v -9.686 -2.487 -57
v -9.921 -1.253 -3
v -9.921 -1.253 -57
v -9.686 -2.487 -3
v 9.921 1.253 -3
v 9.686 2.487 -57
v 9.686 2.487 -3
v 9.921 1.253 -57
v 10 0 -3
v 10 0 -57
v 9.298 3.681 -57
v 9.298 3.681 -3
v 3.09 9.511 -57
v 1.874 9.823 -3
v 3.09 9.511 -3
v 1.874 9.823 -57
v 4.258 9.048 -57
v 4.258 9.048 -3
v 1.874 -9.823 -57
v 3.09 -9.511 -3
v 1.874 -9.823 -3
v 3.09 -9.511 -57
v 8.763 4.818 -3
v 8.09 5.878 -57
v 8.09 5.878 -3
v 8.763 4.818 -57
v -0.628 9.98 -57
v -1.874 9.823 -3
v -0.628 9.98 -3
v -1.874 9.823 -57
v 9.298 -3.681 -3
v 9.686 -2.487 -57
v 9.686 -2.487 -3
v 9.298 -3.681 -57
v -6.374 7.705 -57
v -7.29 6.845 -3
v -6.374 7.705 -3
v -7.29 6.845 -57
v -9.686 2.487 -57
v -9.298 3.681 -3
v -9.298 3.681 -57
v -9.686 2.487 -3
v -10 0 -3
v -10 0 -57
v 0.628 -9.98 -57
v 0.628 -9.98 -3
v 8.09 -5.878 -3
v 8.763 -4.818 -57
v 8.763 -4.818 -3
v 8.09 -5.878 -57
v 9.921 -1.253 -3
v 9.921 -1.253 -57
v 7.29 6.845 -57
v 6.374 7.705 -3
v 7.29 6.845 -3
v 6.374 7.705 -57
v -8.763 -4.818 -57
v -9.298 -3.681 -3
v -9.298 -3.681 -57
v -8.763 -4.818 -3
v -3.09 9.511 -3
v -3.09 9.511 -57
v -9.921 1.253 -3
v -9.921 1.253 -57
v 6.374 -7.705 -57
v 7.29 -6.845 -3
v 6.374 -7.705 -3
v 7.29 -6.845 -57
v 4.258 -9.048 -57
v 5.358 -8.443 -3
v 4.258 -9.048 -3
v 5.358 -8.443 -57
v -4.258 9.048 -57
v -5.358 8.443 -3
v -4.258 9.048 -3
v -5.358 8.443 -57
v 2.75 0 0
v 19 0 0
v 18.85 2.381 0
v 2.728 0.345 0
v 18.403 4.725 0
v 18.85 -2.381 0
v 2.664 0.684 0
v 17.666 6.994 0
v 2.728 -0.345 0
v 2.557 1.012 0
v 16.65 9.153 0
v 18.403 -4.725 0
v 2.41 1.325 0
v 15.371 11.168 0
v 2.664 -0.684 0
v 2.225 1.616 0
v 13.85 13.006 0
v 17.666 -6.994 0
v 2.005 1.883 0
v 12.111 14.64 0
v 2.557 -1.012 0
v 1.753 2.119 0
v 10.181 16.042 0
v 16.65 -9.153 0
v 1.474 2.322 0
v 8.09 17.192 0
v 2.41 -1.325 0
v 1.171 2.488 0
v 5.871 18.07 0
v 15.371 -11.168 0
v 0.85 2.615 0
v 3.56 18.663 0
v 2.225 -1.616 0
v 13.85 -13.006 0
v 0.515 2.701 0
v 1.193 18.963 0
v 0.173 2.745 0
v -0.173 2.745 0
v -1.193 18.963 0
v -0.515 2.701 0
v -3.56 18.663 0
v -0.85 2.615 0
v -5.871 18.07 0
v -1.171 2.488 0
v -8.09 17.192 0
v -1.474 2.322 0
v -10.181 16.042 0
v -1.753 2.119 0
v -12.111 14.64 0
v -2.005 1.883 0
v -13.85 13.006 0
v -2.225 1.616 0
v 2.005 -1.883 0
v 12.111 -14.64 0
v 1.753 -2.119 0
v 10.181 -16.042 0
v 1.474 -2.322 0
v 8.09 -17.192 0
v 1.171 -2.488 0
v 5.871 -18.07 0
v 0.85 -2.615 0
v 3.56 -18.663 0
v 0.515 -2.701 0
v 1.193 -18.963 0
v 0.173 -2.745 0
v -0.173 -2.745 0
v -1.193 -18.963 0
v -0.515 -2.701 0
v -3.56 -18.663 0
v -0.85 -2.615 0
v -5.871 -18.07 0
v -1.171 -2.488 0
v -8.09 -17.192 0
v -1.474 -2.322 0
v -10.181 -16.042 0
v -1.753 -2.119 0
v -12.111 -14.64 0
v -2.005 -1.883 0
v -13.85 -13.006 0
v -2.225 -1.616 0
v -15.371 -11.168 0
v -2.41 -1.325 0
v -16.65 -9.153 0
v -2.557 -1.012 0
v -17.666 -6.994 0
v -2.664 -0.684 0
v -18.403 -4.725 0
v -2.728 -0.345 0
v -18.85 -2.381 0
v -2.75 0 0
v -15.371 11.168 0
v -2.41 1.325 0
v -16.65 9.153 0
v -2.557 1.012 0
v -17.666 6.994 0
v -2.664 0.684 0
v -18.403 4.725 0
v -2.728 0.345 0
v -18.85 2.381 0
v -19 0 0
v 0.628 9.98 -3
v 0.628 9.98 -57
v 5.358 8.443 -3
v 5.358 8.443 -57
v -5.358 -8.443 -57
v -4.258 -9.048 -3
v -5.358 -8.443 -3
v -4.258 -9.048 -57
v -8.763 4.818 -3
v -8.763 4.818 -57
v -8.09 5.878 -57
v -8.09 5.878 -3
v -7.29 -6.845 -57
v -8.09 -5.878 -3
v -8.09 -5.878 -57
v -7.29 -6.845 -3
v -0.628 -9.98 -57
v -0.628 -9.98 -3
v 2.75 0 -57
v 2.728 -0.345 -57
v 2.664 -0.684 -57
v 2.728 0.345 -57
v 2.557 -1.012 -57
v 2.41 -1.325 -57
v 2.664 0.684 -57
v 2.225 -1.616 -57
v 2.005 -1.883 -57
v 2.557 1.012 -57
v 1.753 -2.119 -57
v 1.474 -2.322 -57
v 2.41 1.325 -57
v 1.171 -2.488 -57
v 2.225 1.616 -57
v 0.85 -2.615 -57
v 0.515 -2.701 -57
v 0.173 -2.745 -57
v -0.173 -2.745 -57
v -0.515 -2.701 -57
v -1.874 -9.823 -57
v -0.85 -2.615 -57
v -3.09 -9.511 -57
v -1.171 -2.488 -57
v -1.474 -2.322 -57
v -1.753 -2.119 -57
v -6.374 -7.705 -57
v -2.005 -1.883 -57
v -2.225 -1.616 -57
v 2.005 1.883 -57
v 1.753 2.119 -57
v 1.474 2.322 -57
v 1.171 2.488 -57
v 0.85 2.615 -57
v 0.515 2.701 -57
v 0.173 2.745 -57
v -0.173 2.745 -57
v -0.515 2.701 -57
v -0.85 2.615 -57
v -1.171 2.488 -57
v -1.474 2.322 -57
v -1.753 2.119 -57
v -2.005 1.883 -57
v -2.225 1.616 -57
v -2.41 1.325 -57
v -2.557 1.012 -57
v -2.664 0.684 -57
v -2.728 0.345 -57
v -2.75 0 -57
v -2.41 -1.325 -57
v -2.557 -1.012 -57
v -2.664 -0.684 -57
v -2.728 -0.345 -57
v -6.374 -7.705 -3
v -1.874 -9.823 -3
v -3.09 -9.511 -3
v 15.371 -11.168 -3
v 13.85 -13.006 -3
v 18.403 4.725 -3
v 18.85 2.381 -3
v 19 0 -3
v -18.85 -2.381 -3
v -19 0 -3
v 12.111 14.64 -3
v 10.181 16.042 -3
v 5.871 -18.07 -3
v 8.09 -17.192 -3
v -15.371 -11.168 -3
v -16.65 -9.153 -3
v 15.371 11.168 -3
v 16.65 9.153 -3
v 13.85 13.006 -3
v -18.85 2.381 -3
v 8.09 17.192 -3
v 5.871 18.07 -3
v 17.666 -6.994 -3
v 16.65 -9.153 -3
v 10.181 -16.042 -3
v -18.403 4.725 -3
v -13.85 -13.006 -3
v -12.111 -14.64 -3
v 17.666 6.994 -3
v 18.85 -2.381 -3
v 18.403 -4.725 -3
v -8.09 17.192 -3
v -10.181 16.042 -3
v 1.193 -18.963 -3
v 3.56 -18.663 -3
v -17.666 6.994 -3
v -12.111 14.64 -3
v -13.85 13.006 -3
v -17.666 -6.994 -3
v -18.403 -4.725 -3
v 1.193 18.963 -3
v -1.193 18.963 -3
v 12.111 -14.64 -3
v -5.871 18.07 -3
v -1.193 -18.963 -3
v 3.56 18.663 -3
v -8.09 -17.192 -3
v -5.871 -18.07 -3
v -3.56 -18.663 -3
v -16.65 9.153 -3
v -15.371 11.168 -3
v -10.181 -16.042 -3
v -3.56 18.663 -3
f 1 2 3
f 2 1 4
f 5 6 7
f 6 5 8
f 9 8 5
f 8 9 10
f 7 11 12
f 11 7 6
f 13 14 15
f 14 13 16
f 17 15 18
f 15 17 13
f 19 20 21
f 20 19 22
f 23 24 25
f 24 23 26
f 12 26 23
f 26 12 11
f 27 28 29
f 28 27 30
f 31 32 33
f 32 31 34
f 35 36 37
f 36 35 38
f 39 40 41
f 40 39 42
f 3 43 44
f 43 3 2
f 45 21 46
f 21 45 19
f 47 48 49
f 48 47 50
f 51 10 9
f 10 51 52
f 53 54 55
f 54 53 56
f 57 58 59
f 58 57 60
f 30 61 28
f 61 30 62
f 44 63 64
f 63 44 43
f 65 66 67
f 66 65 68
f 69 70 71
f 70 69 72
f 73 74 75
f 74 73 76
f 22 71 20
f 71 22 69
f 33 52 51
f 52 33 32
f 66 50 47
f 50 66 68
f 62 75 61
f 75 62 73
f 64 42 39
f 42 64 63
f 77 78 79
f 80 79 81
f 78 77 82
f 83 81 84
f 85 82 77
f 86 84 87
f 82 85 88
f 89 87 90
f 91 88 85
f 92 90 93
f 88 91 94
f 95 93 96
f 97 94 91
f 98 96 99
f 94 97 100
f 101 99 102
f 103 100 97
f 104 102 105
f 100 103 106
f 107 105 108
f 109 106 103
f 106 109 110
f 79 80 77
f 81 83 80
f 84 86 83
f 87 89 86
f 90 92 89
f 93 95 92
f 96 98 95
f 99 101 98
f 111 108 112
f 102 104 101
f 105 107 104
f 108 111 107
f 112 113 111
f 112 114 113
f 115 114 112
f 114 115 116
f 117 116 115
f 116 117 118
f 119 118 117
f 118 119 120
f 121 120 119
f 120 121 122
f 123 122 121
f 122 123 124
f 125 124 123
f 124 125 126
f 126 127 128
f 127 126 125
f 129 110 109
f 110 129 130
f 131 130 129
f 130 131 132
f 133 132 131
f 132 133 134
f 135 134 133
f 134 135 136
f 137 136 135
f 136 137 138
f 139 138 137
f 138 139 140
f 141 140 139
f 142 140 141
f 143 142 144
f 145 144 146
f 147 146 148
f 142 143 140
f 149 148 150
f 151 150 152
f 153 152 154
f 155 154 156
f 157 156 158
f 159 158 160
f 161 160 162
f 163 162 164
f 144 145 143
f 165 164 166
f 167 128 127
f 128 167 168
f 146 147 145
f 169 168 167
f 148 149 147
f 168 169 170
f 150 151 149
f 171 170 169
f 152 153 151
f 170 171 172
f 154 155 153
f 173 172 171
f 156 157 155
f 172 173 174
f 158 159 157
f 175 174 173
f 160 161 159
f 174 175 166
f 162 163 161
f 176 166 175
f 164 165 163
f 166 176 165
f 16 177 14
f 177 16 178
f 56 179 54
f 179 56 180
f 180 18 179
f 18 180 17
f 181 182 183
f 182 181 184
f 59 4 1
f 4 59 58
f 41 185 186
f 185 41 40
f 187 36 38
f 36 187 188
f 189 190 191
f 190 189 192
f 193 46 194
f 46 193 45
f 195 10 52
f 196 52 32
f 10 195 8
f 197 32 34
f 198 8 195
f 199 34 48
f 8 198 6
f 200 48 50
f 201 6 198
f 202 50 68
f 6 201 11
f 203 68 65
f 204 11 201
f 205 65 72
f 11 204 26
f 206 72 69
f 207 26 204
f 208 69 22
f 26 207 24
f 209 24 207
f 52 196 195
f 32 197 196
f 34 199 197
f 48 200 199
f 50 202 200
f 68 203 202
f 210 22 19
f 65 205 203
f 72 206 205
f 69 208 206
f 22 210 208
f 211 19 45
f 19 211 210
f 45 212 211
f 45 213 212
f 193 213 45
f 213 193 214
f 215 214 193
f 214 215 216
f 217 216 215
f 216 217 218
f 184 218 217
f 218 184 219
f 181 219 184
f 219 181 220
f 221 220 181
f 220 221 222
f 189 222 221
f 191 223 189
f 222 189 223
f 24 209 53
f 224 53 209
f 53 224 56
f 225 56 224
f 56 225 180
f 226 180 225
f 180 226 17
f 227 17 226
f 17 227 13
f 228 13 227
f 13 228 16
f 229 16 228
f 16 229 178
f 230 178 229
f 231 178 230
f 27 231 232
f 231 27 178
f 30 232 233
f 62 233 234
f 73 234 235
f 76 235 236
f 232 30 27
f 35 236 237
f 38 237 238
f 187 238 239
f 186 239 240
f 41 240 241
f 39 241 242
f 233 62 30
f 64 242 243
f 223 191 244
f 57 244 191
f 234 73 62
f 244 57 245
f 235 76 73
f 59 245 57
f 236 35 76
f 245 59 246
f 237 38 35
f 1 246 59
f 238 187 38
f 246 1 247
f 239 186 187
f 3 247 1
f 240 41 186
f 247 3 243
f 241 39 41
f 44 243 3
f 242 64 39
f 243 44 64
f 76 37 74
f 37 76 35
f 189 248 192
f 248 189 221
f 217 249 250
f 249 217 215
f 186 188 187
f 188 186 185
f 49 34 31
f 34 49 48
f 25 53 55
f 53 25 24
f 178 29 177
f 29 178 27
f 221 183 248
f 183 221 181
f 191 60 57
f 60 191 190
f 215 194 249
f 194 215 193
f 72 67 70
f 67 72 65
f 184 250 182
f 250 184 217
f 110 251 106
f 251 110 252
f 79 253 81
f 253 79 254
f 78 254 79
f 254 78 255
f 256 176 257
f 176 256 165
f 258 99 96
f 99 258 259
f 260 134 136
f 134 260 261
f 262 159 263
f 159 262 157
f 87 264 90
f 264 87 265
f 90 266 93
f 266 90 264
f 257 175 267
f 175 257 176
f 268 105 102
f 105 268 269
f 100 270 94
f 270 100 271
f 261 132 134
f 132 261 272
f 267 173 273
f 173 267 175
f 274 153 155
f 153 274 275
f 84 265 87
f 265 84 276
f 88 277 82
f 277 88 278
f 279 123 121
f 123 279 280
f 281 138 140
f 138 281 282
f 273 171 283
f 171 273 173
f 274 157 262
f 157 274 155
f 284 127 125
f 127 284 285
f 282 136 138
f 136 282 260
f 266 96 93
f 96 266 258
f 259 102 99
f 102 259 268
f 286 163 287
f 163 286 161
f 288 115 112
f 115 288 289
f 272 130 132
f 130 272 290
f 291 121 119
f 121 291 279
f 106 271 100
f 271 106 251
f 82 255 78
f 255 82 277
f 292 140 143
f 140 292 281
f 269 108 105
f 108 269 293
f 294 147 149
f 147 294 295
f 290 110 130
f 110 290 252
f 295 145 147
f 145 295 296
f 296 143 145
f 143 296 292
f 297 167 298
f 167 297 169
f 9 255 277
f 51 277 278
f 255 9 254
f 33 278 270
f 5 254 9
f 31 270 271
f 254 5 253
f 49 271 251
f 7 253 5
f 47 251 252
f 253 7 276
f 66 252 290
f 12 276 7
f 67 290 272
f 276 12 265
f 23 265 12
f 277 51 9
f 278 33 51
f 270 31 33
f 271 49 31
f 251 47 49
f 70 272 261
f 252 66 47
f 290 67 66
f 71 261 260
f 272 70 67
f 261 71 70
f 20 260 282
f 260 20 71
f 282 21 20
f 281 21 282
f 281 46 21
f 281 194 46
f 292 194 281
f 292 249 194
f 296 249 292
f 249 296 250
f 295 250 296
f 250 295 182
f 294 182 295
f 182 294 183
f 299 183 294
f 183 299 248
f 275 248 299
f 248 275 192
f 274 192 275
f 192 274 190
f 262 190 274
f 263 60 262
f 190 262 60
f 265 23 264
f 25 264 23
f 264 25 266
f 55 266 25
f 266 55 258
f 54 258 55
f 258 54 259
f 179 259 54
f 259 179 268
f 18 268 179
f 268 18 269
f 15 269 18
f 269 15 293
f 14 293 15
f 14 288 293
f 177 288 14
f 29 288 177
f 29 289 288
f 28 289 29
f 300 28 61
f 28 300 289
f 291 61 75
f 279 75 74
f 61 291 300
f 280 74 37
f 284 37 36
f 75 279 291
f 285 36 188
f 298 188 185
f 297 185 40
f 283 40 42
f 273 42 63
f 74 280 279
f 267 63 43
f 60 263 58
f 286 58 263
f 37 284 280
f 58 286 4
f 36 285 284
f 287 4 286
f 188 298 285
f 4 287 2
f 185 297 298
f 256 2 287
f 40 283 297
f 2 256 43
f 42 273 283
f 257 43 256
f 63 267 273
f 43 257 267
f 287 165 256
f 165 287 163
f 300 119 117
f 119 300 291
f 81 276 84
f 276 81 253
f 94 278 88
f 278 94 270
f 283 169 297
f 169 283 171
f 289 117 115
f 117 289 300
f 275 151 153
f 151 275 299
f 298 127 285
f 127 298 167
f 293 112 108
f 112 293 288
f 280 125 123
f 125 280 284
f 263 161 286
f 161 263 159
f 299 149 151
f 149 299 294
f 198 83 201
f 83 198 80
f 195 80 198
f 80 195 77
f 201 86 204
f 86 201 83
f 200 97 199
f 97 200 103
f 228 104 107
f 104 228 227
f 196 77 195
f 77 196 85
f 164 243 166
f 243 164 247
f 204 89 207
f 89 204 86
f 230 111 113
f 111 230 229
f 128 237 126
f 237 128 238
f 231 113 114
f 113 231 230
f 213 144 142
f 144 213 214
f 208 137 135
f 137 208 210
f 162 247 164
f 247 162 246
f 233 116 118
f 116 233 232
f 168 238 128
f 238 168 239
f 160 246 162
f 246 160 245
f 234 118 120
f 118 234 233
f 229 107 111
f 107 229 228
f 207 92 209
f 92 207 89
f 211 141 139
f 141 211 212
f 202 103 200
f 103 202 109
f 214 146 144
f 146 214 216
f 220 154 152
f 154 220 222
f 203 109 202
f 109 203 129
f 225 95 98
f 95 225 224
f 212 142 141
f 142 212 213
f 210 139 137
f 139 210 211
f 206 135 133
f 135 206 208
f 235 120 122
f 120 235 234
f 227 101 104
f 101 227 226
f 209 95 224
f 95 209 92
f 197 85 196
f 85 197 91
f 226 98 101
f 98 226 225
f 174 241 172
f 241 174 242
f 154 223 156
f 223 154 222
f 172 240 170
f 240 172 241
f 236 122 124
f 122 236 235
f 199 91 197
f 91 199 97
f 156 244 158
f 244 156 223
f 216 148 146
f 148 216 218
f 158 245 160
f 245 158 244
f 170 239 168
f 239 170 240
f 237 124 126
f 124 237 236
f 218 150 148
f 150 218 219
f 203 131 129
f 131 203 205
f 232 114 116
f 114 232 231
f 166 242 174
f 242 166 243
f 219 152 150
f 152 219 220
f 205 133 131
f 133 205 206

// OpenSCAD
$fn = 50;


difference() {
	union() {
		translate(v = [0, 0, -57.0000000000]) {
			cylinder(h = 57, r = 10.0000000000);
		}
		translate(v = [0, 0, -3.0000000000]) {
			cylinder(h = 3, r = 19.0000000000);
		}
	}
	union() {
		#translate(v = [0, 0, -57]) {
			cylinder(h = 57, r = 2.7500000000);
		}
	}
}
